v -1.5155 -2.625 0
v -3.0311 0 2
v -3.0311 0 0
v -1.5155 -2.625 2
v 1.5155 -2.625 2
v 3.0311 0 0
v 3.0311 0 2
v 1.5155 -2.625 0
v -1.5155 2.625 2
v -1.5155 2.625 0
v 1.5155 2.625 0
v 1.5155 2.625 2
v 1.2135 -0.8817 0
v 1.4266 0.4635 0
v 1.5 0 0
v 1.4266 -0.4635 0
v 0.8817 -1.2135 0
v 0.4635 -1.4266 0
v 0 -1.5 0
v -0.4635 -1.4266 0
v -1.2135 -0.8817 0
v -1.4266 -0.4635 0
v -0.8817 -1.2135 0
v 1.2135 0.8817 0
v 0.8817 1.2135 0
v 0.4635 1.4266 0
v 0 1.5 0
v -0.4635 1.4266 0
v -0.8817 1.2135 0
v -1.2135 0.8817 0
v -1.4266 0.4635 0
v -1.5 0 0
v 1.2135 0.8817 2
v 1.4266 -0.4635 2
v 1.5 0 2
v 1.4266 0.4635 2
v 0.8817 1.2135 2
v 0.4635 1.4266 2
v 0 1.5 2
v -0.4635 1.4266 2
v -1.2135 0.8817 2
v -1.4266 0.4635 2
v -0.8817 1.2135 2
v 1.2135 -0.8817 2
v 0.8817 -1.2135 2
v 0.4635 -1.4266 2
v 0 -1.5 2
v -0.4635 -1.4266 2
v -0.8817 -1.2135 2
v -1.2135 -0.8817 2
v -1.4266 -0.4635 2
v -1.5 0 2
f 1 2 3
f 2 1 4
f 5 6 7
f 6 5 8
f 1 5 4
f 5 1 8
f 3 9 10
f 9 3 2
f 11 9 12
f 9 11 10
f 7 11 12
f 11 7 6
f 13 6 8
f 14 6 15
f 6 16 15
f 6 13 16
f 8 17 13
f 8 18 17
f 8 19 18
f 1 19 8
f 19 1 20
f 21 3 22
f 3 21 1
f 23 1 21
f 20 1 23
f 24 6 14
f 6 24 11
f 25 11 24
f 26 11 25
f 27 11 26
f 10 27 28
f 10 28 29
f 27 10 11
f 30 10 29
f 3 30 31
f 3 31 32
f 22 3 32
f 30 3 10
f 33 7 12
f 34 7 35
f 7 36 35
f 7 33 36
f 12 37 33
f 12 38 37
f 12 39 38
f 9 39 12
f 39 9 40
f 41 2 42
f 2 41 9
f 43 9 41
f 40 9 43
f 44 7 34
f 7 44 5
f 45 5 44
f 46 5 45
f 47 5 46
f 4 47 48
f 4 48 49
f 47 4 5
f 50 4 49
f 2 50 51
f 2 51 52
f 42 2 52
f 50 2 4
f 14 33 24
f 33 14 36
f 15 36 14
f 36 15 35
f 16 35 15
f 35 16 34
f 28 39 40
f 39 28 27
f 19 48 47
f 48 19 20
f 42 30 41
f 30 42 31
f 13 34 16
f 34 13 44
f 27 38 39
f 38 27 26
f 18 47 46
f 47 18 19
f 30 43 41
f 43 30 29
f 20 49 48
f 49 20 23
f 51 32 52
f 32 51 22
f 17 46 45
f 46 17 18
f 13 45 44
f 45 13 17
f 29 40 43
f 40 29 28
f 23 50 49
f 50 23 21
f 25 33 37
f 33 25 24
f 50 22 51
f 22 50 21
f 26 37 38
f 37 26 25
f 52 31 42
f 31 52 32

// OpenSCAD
module hex_nut(width, height, screw)
{
	w = width;
	w2 = width / 2;
	s = w2 / cos(30);
	h = w2 * tan(30);
	
	translate([-s/2, -w2, 0])
	difference()
	{
		linear_extrude(height=height)
			polygon([[0,0],[s,0],[s+h,w2],[s,w],[0,w],[-h,w2],[0,0]]);
		translate([s/2, w2, -0.1])
			cylinder(r = screw / 2, h = height+0.2, $fn=20);
	}
}

hex_nut(5.25, 2, 3);
